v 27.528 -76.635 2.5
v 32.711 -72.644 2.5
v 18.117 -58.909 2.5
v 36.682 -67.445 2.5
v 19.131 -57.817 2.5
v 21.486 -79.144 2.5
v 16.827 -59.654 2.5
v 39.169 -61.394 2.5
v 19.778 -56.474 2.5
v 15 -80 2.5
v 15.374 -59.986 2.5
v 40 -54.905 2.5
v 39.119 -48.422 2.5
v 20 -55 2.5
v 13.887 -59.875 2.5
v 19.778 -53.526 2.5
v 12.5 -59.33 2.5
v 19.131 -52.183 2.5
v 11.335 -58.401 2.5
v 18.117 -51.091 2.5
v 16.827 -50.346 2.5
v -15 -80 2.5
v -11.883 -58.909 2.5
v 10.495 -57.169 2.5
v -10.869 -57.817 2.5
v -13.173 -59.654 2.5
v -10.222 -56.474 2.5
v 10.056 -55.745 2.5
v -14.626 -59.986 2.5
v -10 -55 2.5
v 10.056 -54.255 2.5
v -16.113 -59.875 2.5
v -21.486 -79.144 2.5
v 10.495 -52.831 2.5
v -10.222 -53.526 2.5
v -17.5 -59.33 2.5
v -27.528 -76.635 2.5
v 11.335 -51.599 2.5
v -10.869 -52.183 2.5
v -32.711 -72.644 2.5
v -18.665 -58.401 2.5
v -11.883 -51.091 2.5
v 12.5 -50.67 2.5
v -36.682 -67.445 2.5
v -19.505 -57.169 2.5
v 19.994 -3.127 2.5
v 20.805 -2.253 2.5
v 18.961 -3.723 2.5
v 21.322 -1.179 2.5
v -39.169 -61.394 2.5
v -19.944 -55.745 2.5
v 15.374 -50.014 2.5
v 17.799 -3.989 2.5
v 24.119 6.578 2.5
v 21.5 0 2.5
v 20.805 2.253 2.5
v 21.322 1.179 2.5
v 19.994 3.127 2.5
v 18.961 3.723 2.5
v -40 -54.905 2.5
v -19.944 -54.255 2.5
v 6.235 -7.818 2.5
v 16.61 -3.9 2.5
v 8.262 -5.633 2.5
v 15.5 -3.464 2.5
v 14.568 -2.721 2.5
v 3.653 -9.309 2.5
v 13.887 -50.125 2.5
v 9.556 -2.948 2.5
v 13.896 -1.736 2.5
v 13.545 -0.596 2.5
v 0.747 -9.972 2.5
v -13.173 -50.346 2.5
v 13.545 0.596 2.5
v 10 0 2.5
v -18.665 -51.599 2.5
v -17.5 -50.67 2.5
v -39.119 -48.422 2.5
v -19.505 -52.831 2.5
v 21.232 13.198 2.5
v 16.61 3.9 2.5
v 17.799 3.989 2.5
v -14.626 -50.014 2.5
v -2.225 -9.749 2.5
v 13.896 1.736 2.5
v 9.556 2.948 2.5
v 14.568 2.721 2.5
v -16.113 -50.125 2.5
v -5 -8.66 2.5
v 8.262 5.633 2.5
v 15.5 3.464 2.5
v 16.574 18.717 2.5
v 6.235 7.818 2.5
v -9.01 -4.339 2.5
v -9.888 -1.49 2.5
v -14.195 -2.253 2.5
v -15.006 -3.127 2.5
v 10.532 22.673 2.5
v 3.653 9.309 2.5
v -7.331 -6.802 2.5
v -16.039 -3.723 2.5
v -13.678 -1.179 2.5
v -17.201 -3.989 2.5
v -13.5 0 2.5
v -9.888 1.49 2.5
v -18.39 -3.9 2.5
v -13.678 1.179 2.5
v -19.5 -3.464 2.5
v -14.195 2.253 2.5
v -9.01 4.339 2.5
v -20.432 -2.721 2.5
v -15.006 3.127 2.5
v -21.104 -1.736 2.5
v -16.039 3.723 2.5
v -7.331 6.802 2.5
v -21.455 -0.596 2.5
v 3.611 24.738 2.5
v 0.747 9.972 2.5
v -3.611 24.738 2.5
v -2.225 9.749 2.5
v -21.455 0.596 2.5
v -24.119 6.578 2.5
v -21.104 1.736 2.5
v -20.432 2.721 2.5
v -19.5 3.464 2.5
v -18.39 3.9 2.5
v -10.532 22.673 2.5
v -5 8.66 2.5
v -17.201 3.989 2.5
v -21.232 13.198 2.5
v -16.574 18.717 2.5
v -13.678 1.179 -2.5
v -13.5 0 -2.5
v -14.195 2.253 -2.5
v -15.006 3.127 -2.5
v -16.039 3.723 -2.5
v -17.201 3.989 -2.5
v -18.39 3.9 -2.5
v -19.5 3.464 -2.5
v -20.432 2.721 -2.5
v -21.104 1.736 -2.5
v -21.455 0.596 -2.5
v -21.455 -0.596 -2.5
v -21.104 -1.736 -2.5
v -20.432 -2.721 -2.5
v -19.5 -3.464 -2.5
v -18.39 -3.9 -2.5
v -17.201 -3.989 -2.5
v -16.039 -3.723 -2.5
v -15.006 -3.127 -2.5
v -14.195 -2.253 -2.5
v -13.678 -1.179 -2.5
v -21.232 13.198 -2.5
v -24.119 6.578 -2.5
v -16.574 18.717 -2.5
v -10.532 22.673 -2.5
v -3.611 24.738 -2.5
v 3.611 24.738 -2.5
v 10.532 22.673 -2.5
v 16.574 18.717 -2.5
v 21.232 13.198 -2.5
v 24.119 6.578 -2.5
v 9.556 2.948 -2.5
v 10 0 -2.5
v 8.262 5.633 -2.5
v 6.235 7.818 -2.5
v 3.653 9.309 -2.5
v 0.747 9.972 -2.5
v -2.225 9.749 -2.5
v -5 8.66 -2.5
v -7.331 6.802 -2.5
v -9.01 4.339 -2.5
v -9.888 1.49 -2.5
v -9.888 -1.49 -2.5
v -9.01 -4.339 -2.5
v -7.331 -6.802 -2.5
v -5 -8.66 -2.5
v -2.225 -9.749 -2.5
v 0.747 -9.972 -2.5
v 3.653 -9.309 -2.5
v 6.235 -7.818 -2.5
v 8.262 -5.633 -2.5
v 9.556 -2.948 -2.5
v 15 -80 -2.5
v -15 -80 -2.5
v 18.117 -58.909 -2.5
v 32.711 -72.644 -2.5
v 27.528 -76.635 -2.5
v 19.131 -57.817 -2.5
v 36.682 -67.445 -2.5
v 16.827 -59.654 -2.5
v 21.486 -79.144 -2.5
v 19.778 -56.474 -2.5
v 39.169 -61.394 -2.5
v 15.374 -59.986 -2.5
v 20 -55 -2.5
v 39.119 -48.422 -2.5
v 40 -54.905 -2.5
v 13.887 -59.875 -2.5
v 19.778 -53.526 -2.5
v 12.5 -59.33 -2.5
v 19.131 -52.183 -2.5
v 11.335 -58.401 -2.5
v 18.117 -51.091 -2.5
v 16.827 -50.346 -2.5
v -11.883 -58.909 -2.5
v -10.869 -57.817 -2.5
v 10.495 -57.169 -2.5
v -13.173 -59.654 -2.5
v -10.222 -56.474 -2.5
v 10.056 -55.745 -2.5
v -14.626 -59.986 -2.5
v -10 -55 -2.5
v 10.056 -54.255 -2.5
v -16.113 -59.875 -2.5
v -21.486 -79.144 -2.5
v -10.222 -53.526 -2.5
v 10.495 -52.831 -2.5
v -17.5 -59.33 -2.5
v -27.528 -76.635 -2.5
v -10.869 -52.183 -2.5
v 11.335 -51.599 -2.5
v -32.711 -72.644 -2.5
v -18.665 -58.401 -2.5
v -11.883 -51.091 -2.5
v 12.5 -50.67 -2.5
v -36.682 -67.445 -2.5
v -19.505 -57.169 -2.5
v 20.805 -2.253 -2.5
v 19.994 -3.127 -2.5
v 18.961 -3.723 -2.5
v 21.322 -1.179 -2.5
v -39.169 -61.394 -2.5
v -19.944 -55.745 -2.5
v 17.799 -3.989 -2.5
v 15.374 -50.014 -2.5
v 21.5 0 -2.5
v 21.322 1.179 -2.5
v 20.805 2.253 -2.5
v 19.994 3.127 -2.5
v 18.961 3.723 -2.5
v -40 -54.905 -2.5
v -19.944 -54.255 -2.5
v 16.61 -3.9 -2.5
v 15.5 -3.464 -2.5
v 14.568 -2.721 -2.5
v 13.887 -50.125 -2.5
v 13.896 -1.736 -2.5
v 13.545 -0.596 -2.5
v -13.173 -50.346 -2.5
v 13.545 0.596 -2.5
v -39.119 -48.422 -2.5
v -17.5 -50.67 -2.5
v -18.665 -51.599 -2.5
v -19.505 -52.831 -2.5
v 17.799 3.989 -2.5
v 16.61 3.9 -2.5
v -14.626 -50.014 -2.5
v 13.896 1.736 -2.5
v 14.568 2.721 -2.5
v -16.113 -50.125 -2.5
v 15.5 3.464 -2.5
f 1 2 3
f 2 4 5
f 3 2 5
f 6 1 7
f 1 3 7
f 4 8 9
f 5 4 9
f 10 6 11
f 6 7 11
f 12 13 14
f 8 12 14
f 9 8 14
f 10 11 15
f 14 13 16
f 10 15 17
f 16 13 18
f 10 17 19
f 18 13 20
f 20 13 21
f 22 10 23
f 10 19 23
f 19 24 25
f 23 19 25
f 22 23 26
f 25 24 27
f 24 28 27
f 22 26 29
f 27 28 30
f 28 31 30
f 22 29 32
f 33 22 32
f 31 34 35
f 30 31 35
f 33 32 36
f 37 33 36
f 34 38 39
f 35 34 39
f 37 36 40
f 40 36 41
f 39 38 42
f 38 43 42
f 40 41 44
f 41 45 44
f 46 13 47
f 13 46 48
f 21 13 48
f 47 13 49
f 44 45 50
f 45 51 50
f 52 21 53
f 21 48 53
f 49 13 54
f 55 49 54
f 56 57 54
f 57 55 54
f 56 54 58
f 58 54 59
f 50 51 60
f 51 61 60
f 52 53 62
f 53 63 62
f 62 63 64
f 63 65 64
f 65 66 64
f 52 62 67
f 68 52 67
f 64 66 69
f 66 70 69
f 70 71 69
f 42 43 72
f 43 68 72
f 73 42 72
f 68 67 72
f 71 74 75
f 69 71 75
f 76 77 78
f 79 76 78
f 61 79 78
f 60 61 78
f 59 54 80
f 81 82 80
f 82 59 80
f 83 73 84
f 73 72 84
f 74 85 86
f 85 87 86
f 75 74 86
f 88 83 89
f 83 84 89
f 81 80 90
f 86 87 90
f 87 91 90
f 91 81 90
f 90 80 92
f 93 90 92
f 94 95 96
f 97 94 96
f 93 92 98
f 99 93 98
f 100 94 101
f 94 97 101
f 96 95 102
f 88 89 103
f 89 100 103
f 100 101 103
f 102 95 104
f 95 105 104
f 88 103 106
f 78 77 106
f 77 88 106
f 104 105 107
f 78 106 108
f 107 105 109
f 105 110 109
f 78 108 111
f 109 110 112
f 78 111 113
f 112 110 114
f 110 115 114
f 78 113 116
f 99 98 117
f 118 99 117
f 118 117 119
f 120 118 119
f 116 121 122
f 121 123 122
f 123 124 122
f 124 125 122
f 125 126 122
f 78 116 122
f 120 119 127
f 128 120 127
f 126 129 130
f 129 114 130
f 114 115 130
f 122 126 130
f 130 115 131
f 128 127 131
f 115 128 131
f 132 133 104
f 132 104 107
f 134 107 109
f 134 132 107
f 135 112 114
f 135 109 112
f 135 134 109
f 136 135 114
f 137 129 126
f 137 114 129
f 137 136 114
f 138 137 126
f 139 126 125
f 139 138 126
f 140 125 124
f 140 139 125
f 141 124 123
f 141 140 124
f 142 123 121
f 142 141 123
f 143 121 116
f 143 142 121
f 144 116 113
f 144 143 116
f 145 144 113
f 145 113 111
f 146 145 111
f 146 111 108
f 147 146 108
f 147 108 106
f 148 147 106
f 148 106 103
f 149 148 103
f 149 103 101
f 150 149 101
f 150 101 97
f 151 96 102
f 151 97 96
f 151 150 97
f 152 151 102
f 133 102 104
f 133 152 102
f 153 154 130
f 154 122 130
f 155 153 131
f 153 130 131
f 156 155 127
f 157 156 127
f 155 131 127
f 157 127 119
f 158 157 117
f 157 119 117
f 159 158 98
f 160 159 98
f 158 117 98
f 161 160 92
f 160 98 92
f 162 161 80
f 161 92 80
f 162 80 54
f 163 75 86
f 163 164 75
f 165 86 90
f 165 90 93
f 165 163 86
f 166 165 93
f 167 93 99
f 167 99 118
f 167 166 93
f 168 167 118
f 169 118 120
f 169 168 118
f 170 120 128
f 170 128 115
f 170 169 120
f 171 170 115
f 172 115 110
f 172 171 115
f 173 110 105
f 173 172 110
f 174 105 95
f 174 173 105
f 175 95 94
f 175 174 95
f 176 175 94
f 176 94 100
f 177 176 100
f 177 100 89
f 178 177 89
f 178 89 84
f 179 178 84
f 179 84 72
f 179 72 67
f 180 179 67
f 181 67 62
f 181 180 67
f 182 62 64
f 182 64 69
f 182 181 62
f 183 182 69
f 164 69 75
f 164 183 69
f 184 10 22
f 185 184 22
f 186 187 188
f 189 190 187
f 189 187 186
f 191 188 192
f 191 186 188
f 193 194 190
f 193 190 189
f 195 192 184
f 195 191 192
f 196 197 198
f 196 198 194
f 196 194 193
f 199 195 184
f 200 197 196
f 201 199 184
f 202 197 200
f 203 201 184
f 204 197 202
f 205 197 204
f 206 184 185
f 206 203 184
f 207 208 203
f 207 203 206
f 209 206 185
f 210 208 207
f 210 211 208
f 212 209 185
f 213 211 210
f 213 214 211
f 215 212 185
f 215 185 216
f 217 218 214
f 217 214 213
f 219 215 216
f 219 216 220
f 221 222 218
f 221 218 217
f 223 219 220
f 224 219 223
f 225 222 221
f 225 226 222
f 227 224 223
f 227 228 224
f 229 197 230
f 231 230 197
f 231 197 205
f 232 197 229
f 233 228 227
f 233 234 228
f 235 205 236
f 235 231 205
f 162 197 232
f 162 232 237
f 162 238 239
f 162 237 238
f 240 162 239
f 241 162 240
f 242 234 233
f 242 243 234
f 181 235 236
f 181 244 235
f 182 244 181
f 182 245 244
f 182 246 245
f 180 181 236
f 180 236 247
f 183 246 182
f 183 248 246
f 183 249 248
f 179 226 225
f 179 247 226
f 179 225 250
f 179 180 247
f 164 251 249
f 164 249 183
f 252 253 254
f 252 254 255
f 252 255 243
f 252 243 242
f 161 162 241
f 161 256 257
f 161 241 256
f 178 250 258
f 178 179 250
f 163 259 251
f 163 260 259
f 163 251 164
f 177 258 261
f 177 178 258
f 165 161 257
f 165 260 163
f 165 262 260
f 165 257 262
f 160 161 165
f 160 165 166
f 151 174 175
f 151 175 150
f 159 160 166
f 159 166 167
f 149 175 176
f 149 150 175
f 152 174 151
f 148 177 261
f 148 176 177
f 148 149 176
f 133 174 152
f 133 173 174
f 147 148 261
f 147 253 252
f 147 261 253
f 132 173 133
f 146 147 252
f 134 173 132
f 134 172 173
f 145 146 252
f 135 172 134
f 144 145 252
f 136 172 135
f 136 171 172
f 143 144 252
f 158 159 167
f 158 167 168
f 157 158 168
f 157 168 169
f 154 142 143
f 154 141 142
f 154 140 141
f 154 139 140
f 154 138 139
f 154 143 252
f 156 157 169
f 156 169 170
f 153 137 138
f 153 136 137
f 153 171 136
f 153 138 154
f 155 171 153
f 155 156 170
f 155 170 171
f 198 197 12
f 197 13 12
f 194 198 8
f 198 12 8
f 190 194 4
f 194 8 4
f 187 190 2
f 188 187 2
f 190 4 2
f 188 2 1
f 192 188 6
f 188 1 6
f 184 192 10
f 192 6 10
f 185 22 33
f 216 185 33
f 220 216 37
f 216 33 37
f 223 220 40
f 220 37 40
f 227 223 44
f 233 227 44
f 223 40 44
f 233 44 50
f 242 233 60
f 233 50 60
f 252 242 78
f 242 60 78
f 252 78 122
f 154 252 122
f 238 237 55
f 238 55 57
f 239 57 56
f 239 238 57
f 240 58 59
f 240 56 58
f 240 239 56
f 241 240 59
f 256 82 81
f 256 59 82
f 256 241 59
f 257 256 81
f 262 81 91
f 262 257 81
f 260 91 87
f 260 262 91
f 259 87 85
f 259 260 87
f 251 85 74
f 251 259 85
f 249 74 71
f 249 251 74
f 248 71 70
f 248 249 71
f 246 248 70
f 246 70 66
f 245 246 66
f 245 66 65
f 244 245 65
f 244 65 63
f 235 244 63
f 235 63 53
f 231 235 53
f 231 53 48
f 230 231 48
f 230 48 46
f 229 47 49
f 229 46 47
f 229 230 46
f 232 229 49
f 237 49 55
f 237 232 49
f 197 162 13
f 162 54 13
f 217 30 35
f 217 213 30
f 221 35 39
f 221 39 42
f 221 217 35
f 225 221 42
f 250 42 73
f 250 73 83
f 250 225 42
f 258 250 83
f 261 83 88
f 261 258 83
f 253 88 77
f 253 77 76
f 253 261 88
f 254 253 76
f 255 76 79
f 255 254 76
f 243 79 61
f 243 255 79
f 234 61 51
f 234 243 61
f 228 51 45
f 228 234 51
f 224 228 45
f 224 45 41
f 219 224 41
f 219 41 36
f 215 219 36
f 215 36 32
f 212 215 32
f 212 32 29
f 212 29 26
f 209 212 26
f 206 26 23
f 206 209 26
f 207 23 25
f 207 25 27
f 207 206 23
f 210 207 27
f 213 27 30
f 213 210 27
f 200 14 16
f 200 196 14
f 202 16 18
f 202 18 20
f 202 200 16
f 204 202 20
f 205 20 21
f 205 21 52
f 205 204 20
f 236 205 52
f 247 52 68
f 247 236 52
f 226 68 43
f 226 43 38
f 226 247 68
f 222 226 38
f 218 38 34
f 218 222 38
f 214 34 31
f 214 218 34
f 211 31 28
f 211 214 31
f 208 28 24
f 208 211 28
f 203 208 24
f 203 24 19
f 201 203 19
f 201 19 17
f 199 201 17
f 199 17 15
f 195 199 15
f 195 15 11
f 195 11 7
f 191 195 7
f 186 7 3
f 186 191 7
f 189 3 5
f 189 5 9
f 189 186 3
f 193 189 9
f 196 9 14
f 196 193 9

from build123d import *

# Parameters (mm, degrees)
SKETCH1_R               = 10
SKETCH1_R_2             = 5
BOSS_EXTRUDE2_DEPTH     = 2.5
CUT_EXTRUDE1_DEPTH      = 90.477650841
CUT_EXTRUDE1_DEPTH_BACK = 90.477650841
SKETCH3_R               = 4


with BuildPart() as part:
    # Sketch1 → Boss-Extrude2 (new, symmetric)
    with BuildSketch(Plane.XY):
        with BuildLine():
            Line((-39.119095531, -48.422064855), (-24.119095531, 6.577935145))
            ThreePointArc((-24.119095531, 6.577935145), (0, 25), (24.119095531, 6.577935145))
            Line((24.119095531, 6.577935145), (39.119095531, -48.422064855))
            ThreePointArc((39.119095531, -48.422064855), (34.867666932, -70.174841373), (15, -80))
            Line((15, -80), (-15, -80))
            ThreePointArc((-15, -80), (-34.867666932, -70.174841373), (-39.119095531, -48.422064855))
        make_face()
        Circle(SKETCH1_R, mode=Mode.SUBTRACT)
        with Locations((-15, -55)):
            Circle(SKETCH1_R_2, mode=Mode.SUBTRACT)
        with Locations((15, -55)):
            Circle(SKETCH1_R_2, mode=Mode.SUBTRACT)
    extrude(amount=BOSS_EXTRUDE2_DEPTH, both=True)

    # Sketch3 → Cut-Extrude1 (cut, two sides: drawn at the far end of the back side and taken through both)
    with BuildSketch(Plane.XY.offset(-CUT_EXTRUDE1_DEPTH_BACK)):
        with Locations((17.5, 0)):
            Circle(SKETCH3_R)
        with Locations((-17.5, 0)):
            Circle(SKETCH3_R)
    extrude(amount=CUT_EXTRUDE1_DEPTH + CUT_EXTRUDE1_DEPTH_BACK, mode=Mode.SUBTRACT)


solid = part.part
